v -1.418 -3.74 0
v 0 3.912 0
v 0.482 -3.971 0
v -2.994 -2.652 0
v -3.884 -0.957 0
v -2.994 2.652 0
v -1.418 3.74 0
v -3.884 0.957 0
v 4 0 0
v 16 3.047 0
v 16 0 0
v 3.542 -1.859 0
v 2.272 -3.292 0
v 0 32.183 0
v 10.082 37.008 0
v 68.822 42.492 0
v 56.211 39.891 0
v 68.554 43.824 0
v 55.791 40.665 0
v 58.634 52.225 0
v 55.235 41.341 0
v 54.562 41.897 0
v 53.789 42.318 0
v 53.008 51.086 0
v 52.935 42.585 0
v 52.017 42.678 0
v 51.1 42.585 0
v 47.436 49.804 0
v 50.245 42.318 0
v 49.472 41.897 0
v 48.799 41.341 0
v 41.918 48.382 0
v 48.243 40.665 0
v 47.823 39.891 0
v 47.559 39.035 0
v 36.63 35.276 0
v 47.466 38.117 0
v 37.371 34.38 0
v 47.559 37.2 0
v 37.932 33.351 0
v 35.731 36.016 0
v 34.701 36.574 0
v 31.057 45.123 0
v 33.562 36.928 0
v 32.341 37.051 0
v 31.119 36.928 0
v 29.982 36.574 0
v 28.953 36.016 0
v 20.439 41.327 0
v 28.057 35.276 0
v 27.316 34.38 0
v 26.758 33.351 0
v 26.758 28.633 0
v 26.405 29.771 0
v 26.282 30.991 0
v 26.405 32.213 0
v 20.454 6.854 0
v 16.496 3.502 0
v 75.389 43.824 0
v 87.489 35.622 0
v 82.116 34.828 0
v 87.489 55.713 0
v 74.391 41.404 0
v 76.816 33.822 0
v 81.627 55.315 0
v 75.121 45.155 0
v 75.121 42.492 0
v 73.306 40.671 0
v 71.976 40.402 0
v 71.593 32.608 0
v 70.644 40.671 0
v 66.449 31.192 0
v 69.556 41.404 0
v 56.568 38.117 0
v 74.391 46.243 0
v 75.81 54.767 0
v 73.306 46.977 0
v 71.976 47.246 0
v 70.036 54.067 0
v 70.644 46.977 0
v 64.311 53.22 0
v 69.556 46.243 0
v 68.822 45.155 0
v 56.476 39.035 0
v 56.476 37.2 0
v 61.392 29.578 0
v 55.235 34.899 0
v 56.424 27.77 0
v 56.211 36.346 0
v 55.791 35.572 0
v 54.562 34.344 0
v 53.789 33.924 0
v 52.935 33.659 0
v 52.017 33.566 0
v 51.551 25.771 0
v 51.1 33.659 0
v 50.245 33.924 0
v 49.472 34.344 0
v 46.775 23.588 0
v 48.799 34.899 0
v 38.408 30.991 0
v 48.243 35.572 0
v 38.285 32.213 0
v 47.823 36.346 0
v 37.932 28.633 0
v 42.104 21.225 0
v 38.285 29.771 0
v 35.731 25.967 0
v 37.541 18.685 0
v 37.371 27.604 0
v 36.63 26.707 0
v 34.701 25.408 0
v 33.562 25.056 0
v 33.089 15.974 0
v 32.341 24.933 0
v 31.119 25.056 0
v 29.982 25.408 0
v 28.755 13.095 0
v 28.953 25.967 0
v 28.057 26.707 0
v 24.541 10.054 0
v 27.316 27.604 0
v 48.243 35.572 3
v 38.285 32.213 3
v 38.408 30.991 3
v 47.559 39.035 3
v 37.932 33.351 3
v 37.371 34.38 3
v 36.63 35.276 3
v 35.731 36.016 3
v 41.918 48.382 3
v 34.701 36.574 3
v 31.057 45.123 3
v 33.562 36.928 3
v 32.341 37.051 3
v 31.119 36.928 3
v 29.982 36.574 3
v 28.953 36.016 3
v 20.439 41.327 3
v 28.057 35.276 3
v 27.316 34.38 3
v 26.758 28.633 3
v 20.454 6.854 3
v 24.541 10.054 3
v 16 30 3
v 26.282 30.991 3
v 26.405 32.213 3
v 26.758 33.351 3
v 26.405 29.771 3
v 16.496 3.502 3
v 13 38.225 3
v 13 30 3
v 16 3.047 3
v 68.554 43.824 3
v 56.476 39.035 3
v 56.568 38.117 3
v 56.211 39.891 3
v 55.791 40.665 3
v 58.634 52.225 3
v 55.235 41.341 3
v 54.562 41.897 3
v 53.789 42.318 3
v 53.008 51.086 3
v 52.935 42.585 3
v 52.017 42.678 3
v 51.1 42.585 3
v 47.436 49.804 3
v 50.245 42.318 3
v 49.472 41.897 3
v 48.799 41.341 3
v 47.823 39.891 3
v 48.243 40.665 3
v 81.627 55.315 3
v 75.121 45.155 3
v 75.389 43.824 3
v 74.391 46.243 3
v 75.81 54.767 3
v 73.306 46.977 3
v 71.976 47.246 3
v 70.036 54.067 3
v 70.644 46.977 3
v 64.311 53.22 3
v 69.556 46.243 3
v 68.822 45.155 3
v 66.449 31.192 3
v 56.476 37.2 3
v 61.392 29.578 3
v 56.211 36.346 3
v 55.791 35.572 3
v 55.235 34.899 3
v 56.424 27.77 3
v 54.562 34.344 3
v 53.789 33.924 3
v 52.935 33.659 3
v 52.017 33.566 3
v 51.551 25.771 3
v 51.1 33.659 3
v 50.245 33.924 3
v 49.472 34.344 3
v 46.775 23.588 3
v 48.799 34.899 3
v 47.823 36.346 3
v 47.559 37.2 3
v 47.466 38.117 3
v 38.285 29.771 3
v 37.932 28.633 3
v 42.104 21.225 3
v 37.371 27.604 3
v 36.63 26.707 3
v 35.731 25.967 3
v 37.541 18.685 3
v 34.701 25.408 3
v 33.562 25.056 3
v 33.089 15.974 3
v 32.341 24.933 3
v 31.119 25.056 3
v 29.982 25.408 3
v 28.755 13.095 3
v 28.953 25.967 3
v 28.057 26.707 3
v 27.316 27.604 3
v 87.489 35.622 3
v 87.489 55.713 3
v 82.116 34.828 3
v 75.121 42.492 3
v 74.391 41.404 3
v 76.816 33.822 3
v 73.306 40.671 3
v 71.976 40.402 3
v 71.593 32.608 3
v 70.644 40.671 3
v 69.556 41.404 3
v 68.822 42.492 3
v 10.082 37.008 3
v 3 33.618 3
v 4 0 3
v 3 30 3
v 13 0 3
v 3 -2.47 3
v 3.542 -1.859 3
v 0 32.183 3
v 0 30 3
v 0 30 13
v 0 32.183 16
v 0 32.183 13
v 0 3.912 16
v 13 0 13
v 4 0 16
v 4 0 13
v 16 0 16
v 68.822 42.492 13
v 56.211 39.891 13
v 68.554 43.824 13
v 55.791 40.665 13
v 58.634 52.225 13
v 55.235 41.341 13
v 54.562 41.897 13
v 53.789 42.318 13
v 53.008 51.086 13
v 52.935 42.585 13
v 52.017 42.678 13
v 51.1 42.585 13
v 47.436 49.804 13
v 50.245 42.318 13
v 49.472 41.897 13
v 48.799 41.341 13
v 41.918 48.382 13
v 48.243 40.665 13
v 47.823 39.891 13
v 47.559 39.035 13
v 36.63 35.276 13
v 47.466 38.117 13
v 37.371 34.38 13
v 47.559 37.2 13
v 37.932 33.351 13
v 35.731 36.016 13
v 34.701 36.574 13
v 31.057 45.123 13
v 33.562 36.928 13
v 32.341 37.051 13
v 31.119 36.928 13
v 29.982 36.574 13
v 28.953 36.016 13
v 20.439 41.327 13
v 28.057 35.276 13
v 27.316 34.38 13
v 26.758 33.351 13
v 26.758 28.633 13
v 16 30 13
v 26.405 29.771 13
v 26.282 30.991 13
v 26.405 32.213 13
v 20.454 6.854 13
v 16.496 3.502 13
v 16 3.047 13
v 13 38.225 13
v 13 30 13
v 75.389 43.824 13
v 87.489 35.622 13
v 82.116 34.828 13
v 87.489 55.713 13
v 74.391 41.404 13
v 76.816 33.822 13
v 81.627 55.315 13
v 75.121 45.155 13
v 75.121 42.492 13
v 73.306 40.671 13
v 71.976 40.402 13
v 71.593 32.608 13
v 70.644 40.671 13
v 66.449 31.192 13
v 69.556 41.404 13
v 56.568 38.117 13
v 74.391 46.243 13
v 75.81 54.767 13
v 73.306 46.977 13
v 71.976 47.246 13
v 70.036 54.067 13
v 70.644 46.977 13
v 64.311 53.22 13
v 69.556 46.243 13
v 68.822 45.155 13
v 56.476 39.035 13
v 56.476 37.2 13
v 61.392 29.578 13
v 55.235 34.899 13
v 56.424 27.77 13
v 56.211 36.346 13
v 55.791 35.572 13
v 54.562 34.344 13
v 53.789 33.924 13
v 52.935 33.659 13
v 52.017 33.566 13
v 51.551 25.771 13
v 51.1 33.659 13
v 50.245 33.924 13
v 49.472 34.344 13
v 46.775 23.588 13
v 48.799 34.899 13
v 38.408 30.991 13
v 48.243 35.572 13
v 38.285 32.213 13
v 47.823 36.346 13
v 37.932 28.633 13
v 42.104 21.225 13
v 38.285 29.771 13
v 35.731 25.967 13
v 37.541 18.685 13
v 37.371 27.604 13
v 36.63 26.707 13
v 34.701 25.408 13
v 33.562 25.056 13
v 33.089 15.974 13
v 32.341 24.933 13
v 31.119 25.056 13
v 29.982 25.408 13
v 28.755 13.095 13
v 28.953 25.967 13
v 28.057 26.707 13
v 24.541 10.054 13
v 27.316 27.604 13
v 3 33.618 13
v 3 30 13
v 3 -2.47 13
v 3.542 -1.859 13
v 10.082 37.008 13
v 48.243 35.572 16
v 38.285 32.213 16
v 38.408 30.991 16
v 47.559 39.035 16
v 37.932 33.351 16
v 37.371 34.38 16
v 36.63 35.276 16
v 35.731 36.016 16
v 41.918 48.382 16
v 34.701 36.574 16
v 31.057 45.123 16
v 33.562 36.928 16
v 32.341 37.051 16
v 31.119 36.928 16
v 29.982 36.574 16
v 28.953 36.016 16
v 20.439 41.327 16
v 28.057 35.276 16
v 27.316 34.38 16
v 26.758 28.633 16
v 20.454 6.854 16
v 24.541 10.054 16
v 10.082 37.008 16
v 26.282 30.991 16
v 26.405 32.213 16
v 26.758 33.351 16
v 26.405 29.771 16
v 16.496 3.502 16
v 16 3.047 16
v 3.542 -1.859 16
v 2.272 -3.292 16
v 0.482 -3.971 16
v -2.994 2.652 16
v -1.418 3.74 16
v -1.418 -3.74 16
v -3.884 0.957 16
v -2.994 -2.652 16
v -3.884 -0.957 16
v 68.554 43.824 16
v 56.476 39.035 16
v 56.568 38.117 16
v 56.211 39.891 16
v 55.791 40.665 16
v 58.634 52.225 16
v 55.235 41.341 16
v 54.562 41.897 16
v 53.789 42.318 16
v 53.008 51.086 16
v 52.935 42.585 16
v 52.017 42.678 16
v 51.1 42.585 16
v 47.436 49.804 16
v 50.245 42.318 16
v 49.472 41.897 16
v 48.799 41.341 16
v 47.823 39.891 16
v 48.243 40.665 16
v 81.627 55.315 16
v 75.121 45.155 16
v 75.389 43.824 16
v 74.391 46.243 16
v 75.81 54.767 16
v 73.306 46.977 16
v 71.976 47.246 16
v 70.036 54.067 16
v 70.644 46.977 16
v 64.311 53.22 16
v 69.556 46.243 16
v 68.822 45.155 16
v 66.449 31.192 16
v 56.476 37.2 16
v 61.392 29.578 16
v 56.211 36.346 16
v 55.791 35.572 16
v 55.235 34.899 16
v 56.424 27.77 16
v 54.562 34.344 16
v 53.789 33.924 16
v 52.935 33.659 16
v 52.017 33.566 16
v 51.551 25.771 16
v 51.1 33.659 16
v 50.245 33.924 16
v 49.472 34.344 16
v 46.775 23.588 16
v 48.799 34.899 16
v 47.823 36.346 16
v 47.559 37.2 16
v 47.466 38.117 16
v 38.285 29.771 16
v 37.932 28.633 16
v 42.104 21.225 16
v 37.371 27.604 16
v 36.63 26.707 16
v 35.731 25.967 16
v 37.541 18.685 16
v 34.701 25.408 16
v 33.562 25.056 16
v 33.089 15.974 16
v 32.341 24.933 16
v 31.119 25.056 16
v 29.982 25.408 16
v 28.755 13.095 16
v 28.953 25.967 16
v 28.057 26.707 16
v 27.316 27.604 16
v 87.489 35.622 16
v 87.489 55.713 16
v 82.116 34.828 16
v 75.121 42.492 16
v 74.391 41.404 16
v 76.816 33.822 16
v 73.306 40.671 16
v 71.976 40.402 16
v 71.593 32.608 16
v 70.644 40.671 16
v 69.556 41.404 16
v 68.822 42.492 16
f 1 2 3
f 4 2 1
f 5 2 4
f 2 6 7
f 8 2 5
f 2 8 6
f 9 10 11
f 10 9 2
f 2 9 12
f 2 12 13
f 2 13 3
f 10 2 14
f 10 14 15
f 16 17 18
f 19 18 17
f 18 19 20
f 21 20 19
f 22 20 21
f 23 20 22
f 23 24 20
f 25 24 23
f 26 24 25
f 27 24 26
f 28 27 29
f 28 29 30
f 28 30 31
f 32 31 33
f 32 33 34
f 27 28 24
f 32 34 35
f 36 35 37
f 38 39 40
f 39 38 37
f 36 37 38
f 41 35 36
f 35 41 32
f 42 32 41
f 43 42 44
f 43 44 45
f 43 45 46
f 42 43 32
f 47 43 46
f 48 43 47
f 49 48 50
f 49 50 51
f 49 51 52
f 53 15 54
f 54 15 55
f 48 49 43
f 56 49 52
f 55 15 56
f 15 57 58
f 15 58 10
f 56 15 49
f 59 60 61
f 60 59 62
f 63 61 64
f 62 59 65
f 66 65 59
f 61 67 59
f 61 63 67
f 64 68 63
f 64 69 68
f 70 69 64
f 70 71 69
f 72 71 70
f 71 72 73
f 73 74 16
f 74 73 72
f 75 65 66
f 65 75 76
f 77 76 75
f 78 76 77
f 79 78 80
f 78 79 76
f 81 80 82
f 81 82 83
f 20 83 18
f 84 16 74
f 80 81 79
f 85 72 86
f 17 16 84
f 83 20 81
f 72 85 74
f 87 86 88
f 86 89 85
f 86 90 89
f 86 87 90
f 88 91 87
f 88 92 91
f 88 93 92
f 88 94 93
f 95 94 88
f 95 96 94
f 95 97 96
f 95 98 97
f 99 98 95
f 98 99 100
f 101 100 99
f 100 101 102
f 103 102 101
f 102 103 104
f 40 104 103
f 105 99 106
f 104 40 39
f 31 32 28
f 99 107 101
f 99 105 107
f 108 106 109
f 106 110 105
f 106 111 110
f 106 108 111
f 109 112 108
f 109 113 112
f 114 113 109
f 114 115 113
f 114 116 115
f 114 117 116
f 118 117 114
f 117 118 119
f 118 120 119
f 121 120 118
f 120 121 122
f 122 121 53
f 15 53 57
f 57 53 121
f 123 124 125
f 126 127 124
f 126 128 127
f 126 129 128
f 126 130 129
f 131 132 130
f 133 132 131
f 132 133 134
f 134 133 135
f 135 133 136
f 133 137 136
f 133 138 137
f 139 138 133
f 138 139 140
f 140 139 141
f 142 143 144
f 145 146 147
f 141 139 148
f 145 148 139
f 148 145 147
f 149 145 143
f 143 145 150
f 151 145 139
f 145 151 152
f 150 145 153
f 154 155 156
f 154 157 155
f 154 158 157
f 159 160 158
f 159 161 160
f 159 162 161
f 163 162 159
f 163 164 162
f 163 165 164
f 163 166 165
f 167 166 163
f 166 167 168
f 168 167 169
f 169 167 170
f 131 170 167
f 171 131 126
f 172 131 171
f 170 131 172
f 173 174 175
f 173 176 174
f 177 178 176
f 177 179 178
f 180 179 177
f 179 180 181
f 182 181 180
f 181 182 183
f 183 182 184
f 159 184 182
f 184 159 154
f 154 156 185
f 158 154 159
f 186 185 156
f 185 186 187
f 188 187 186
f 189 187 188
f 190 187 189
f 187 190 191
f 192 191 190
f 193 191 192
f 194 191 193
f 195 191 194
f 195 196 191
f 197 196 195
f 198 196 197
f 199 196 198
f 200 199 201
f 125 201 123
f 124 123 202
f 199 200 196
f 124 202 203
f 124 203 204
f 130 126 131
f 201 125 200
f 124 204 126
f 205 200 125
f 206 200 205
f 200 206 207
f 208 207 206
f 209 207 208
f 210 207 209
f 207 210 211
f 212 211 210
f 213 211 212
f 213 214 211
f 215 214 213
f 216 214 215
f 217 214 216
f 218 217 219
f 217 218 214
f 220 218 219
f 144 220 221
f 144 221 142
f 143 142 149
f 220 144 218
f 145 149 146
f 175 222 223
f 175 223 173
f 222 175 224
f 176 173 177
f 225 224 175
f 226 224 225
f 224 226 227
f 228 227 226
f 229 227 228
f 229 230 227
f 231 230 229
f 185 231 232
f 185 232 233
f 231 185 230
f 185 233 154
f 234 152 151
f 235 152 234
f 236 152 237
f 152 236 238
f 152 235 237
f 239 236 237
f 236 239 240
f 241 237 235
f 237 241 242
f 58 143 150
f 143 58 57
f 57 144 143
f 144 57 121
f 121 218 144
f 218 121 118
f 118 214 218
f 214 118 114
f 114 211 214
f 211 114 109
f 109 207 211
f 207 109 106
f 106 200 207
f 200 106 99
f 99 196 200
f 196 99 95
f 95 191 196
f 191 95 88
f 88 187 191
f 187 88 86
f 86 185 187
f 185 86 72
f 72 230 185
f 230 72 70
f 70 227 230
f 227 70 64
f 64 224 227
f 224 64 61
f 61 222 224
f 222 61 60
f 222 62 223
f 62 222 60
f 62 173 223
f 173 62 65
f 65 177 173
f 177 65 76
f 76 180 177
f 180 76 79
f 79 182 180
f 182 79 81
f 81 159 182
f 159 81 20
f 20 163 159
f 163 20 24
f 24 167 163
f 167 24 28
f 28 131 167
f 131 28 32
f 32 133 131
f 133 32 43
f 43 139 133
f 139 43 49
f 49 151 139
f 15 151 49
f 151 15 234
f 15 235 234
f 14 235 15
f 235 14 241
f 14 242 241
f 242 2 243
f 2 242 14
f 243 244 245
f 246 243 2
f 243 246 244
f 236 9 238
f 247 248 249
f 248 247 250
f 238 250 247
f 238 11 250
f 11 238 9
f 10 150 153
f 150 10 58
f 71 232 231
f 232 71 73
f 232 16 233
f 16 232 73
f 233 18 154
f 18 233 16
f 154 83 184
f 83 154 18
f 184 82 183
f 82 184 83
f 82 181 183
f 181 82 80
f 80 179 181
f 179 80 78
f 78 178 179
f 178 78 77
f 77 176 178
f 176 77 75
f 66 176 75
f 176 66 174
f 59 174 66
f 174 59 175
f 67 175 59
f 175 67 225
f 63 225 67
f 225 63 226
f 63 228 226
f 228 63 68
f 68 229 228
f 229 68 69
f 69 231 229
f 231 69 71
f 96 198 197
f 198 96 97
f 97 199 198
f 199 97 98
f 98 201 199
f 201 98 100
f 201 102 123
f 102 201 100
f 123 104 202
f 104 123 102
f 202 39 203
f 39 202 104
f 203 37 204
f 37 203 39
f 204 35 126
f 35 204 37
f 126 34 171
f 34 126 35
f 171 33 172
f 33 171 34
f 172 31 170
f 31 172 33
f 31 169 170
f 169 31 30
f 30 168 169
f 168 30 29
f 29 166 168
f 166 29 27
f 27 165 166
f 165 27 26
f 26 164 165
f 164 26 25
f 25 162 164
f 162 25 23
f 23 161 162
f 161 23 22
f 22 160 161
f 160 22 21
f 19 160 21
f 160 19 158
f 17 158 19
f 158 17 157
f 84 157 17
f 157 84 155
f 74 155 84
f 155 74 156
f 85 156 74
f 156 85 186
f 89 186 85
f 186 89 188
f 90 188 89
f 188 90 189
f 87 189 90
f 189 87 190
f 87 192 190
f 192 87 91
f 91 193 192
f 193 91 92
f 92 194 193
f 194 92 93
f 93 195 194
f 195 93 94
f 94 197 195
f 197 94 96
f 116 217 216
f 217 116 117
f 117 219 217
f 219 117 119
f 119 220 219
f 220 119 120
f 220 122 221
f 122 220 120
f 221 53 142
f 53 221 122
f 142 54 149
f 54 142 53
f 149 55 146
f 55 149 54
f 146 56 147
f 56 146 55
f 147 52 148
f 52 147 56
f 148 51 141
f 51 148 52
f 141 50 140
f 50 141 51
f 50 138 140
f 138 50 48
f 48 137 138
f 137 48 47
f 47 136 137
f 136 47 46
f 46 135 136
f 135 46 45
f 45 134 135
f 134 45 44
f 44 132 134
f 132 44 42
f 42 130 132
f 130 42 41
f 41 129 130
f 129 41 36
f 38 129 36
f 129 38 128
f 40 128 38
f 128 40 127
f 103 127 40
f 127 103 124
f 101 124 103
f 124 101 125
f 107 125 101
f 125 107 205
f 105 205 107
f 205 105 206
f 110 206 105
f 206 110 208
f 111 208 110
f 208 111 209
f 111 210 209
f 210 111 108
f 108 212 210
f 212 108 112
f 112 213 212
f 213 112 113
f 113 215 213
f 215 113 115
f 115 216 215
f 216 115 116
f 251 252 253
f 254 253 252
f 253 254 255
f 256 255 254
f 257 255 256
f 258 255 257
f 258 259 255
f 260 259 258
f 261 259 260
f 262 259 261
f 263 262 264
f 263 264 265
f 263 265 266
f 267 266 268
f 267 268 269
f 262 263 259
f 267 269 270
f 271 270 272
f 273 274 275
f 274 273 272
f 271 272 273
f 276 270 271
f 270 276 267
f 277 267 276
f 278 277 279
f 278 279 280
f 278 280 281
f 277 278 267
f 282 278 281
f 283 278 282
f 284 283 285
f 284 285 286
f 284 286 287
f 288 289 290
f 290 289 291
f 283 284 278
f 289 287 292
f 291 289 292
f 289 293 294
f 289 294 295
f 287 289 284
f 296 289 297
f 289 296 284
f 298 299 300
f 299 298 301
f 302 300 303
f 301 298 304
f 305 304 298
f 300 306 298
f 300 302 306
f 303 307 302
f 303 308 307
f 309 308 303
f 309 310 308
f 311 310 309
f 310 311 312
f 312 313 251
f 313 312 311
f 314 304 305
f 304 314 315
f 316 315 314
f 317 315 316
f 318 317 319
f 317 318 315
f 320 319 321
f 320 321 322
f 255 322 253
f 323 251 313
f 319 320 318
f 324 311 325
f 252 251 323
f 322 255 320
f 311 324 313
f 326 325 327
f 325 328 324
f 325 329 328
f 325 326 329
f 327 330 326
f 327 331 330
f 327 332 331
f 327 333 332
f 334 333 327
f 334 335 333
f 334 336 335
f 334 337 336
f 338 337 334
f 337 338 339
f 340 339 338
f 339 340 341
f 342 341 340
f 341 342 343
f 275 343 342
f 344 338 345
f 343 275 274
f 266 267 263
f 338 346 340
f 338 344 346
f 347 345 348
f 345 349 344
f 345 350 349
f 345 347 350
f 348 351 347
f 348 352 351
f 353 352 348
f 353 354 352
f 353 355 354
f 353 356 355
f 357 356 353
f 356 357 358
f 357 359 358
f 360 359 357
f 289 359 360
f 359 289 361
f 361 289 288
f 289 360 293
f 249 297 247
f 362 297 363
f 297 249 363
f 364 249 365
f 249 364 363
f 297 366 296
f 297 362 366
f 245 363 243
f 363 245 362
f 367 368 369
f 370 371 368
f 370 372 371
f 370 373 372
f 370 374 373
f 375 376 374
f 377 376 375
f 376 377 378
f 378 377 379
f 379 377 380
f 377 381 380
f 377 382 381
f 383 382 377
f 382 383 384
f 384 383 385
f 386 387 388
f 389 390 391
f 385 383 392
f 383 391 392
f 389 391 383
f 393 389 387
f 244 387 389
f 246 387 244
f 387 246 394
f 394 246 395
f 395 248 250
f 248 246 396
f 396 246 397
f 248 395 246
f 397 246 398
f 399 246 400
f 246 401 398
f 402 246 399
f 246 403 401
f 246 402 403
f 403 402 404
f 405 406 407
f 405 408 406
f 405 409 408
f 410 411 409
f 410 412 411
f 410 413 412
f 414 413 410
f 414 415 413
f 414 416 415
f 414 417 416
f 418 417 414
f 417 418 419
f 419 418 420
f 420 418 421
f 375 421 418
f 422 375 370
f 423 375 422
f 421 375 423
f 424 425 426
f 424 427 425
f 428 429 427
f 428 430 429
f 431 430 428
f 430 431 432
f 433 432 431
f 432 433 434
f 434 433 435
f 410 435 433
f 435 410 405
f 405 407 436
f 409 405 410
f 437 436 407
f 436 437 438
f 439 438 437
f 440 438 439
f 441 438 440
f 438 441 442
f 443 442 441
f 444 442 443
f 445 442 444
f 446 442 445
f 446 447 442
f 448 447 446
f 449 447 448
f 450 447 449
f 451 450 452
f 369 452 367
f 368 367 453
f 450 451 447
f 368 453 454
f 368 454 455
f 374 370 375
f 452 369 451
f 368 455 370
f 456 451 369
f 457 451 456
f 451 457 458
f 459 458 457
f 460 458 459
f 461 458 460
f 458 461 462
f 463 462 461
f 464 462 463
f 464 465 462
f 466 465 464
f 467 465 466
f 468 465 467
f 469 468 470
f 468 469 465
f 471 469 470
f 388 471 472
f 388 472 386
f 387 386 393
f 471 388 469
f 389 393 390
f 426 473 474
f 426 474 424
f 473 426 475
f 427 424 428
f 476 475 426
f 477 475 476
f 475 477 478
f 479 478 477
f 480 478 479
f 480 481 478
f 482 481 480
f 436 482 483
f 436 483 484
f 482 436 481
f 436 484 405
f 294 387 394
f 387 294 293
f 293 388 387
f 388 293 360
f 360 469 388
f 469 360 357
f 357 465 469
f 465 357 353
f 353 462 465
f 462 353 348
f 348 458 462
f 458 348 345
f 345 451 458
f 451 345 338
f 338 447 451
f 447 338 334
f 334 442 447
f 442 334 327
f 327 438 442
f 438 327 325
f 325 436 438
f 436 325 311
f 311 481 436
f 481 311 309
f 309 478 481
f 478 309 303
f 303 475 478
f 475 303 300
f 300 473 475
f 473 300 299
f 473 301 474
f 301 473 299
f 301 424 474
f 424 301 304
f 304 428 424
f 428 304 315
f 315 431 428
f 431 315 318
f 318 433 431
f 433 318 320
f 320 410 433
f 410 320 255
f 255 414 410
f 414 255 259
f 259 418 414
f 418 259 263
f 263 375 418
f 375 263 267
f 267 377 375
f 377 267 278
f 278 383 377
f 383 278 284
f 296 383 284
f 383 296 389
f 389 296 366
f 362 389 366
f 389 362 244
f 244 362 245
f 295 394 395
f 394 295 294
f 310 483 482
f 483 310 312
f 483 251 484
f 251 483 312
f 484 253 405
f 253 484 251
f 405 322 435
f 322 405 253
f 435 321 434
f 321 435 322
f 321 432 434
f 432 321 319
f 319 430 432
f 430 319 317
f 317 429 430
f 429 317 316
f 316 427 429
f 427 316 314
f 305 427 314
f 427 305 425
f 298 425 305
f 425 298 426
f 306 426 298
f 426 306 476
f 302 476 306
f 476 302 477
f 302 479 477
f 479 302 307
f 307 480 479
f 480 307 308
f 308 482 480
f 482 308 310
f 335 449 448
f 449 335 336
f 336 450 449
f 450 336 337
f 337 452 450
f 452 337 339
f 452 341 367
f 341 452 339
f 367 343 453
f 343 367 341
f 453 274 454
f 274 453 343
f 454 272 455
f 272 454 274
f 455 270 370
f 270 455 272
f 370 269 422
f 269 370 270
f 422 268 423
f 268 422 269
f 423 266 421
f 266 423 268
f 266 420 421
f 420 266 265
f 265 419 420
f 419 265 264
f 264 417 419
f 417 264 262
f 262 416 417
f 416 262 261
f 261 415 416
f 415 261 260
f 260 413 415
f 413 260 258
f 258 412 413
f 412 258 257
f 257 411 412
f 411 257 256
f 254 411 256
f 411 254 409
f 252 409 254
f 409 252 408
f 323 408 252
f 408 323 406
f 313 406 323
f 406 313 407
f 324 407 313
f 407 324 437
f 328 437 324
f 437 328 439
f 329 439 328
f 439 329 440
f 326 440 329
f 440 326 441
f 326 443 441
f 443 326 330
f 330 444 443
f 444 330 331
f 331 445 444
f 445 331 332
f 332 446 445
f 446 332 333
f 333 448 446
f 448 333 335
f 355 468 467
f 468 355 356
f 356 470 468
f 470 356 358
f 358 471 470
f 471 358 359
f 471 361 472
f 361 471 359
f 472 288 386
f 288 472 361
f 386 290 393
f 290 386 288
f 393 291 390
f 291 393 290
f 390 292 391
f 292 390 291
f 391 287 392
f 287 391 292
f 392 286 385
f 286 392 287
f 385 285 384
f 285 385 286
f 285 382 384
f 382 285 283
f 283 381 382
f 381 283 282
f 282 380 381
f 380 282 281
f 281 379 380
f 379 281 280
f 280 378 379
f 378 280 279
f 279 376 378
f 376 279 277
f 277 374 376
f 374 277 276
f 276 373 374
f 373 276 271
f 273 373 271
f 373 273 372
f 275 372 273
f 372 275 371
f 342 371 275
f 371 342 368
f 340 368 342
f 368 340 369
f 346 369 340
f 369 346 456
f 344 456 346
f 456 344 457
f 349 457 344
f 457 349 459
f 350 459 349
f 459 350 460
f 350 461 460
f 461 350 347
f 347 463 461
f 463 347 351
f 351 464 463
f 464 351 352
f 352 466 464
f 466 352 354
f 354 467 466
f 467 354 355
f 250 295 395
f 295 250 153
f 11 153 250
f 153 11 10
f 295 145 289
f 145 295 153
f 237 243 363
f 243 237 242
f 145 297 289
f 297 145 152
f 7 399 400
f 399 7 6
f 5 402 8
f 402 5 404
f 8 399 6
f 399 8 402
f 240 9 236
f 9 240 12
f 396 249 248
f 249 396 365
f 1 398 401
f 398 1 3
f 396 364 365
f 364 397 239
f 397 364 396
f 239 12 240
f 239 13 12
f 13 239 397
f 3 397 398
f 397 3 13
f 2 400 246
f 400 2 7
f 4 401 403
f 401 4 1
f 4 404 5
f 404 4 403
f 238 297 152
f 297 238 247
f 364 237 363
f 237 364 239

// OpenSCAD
difference() {
    union() {
        dxf_linear_extrude(file="lg_strut_01.dxf", height=3, convexity=1, center=false);
        translate([0,0,13]) dxf_linear_extrude(file="lg_strut_01.dxf", height=3, convexity=1, center=false);
        cube([16,30,16]);
        #cylinder(h=16, r=4);
    }
    translate([3,-10,3]) cube([10,50,10]);
}
